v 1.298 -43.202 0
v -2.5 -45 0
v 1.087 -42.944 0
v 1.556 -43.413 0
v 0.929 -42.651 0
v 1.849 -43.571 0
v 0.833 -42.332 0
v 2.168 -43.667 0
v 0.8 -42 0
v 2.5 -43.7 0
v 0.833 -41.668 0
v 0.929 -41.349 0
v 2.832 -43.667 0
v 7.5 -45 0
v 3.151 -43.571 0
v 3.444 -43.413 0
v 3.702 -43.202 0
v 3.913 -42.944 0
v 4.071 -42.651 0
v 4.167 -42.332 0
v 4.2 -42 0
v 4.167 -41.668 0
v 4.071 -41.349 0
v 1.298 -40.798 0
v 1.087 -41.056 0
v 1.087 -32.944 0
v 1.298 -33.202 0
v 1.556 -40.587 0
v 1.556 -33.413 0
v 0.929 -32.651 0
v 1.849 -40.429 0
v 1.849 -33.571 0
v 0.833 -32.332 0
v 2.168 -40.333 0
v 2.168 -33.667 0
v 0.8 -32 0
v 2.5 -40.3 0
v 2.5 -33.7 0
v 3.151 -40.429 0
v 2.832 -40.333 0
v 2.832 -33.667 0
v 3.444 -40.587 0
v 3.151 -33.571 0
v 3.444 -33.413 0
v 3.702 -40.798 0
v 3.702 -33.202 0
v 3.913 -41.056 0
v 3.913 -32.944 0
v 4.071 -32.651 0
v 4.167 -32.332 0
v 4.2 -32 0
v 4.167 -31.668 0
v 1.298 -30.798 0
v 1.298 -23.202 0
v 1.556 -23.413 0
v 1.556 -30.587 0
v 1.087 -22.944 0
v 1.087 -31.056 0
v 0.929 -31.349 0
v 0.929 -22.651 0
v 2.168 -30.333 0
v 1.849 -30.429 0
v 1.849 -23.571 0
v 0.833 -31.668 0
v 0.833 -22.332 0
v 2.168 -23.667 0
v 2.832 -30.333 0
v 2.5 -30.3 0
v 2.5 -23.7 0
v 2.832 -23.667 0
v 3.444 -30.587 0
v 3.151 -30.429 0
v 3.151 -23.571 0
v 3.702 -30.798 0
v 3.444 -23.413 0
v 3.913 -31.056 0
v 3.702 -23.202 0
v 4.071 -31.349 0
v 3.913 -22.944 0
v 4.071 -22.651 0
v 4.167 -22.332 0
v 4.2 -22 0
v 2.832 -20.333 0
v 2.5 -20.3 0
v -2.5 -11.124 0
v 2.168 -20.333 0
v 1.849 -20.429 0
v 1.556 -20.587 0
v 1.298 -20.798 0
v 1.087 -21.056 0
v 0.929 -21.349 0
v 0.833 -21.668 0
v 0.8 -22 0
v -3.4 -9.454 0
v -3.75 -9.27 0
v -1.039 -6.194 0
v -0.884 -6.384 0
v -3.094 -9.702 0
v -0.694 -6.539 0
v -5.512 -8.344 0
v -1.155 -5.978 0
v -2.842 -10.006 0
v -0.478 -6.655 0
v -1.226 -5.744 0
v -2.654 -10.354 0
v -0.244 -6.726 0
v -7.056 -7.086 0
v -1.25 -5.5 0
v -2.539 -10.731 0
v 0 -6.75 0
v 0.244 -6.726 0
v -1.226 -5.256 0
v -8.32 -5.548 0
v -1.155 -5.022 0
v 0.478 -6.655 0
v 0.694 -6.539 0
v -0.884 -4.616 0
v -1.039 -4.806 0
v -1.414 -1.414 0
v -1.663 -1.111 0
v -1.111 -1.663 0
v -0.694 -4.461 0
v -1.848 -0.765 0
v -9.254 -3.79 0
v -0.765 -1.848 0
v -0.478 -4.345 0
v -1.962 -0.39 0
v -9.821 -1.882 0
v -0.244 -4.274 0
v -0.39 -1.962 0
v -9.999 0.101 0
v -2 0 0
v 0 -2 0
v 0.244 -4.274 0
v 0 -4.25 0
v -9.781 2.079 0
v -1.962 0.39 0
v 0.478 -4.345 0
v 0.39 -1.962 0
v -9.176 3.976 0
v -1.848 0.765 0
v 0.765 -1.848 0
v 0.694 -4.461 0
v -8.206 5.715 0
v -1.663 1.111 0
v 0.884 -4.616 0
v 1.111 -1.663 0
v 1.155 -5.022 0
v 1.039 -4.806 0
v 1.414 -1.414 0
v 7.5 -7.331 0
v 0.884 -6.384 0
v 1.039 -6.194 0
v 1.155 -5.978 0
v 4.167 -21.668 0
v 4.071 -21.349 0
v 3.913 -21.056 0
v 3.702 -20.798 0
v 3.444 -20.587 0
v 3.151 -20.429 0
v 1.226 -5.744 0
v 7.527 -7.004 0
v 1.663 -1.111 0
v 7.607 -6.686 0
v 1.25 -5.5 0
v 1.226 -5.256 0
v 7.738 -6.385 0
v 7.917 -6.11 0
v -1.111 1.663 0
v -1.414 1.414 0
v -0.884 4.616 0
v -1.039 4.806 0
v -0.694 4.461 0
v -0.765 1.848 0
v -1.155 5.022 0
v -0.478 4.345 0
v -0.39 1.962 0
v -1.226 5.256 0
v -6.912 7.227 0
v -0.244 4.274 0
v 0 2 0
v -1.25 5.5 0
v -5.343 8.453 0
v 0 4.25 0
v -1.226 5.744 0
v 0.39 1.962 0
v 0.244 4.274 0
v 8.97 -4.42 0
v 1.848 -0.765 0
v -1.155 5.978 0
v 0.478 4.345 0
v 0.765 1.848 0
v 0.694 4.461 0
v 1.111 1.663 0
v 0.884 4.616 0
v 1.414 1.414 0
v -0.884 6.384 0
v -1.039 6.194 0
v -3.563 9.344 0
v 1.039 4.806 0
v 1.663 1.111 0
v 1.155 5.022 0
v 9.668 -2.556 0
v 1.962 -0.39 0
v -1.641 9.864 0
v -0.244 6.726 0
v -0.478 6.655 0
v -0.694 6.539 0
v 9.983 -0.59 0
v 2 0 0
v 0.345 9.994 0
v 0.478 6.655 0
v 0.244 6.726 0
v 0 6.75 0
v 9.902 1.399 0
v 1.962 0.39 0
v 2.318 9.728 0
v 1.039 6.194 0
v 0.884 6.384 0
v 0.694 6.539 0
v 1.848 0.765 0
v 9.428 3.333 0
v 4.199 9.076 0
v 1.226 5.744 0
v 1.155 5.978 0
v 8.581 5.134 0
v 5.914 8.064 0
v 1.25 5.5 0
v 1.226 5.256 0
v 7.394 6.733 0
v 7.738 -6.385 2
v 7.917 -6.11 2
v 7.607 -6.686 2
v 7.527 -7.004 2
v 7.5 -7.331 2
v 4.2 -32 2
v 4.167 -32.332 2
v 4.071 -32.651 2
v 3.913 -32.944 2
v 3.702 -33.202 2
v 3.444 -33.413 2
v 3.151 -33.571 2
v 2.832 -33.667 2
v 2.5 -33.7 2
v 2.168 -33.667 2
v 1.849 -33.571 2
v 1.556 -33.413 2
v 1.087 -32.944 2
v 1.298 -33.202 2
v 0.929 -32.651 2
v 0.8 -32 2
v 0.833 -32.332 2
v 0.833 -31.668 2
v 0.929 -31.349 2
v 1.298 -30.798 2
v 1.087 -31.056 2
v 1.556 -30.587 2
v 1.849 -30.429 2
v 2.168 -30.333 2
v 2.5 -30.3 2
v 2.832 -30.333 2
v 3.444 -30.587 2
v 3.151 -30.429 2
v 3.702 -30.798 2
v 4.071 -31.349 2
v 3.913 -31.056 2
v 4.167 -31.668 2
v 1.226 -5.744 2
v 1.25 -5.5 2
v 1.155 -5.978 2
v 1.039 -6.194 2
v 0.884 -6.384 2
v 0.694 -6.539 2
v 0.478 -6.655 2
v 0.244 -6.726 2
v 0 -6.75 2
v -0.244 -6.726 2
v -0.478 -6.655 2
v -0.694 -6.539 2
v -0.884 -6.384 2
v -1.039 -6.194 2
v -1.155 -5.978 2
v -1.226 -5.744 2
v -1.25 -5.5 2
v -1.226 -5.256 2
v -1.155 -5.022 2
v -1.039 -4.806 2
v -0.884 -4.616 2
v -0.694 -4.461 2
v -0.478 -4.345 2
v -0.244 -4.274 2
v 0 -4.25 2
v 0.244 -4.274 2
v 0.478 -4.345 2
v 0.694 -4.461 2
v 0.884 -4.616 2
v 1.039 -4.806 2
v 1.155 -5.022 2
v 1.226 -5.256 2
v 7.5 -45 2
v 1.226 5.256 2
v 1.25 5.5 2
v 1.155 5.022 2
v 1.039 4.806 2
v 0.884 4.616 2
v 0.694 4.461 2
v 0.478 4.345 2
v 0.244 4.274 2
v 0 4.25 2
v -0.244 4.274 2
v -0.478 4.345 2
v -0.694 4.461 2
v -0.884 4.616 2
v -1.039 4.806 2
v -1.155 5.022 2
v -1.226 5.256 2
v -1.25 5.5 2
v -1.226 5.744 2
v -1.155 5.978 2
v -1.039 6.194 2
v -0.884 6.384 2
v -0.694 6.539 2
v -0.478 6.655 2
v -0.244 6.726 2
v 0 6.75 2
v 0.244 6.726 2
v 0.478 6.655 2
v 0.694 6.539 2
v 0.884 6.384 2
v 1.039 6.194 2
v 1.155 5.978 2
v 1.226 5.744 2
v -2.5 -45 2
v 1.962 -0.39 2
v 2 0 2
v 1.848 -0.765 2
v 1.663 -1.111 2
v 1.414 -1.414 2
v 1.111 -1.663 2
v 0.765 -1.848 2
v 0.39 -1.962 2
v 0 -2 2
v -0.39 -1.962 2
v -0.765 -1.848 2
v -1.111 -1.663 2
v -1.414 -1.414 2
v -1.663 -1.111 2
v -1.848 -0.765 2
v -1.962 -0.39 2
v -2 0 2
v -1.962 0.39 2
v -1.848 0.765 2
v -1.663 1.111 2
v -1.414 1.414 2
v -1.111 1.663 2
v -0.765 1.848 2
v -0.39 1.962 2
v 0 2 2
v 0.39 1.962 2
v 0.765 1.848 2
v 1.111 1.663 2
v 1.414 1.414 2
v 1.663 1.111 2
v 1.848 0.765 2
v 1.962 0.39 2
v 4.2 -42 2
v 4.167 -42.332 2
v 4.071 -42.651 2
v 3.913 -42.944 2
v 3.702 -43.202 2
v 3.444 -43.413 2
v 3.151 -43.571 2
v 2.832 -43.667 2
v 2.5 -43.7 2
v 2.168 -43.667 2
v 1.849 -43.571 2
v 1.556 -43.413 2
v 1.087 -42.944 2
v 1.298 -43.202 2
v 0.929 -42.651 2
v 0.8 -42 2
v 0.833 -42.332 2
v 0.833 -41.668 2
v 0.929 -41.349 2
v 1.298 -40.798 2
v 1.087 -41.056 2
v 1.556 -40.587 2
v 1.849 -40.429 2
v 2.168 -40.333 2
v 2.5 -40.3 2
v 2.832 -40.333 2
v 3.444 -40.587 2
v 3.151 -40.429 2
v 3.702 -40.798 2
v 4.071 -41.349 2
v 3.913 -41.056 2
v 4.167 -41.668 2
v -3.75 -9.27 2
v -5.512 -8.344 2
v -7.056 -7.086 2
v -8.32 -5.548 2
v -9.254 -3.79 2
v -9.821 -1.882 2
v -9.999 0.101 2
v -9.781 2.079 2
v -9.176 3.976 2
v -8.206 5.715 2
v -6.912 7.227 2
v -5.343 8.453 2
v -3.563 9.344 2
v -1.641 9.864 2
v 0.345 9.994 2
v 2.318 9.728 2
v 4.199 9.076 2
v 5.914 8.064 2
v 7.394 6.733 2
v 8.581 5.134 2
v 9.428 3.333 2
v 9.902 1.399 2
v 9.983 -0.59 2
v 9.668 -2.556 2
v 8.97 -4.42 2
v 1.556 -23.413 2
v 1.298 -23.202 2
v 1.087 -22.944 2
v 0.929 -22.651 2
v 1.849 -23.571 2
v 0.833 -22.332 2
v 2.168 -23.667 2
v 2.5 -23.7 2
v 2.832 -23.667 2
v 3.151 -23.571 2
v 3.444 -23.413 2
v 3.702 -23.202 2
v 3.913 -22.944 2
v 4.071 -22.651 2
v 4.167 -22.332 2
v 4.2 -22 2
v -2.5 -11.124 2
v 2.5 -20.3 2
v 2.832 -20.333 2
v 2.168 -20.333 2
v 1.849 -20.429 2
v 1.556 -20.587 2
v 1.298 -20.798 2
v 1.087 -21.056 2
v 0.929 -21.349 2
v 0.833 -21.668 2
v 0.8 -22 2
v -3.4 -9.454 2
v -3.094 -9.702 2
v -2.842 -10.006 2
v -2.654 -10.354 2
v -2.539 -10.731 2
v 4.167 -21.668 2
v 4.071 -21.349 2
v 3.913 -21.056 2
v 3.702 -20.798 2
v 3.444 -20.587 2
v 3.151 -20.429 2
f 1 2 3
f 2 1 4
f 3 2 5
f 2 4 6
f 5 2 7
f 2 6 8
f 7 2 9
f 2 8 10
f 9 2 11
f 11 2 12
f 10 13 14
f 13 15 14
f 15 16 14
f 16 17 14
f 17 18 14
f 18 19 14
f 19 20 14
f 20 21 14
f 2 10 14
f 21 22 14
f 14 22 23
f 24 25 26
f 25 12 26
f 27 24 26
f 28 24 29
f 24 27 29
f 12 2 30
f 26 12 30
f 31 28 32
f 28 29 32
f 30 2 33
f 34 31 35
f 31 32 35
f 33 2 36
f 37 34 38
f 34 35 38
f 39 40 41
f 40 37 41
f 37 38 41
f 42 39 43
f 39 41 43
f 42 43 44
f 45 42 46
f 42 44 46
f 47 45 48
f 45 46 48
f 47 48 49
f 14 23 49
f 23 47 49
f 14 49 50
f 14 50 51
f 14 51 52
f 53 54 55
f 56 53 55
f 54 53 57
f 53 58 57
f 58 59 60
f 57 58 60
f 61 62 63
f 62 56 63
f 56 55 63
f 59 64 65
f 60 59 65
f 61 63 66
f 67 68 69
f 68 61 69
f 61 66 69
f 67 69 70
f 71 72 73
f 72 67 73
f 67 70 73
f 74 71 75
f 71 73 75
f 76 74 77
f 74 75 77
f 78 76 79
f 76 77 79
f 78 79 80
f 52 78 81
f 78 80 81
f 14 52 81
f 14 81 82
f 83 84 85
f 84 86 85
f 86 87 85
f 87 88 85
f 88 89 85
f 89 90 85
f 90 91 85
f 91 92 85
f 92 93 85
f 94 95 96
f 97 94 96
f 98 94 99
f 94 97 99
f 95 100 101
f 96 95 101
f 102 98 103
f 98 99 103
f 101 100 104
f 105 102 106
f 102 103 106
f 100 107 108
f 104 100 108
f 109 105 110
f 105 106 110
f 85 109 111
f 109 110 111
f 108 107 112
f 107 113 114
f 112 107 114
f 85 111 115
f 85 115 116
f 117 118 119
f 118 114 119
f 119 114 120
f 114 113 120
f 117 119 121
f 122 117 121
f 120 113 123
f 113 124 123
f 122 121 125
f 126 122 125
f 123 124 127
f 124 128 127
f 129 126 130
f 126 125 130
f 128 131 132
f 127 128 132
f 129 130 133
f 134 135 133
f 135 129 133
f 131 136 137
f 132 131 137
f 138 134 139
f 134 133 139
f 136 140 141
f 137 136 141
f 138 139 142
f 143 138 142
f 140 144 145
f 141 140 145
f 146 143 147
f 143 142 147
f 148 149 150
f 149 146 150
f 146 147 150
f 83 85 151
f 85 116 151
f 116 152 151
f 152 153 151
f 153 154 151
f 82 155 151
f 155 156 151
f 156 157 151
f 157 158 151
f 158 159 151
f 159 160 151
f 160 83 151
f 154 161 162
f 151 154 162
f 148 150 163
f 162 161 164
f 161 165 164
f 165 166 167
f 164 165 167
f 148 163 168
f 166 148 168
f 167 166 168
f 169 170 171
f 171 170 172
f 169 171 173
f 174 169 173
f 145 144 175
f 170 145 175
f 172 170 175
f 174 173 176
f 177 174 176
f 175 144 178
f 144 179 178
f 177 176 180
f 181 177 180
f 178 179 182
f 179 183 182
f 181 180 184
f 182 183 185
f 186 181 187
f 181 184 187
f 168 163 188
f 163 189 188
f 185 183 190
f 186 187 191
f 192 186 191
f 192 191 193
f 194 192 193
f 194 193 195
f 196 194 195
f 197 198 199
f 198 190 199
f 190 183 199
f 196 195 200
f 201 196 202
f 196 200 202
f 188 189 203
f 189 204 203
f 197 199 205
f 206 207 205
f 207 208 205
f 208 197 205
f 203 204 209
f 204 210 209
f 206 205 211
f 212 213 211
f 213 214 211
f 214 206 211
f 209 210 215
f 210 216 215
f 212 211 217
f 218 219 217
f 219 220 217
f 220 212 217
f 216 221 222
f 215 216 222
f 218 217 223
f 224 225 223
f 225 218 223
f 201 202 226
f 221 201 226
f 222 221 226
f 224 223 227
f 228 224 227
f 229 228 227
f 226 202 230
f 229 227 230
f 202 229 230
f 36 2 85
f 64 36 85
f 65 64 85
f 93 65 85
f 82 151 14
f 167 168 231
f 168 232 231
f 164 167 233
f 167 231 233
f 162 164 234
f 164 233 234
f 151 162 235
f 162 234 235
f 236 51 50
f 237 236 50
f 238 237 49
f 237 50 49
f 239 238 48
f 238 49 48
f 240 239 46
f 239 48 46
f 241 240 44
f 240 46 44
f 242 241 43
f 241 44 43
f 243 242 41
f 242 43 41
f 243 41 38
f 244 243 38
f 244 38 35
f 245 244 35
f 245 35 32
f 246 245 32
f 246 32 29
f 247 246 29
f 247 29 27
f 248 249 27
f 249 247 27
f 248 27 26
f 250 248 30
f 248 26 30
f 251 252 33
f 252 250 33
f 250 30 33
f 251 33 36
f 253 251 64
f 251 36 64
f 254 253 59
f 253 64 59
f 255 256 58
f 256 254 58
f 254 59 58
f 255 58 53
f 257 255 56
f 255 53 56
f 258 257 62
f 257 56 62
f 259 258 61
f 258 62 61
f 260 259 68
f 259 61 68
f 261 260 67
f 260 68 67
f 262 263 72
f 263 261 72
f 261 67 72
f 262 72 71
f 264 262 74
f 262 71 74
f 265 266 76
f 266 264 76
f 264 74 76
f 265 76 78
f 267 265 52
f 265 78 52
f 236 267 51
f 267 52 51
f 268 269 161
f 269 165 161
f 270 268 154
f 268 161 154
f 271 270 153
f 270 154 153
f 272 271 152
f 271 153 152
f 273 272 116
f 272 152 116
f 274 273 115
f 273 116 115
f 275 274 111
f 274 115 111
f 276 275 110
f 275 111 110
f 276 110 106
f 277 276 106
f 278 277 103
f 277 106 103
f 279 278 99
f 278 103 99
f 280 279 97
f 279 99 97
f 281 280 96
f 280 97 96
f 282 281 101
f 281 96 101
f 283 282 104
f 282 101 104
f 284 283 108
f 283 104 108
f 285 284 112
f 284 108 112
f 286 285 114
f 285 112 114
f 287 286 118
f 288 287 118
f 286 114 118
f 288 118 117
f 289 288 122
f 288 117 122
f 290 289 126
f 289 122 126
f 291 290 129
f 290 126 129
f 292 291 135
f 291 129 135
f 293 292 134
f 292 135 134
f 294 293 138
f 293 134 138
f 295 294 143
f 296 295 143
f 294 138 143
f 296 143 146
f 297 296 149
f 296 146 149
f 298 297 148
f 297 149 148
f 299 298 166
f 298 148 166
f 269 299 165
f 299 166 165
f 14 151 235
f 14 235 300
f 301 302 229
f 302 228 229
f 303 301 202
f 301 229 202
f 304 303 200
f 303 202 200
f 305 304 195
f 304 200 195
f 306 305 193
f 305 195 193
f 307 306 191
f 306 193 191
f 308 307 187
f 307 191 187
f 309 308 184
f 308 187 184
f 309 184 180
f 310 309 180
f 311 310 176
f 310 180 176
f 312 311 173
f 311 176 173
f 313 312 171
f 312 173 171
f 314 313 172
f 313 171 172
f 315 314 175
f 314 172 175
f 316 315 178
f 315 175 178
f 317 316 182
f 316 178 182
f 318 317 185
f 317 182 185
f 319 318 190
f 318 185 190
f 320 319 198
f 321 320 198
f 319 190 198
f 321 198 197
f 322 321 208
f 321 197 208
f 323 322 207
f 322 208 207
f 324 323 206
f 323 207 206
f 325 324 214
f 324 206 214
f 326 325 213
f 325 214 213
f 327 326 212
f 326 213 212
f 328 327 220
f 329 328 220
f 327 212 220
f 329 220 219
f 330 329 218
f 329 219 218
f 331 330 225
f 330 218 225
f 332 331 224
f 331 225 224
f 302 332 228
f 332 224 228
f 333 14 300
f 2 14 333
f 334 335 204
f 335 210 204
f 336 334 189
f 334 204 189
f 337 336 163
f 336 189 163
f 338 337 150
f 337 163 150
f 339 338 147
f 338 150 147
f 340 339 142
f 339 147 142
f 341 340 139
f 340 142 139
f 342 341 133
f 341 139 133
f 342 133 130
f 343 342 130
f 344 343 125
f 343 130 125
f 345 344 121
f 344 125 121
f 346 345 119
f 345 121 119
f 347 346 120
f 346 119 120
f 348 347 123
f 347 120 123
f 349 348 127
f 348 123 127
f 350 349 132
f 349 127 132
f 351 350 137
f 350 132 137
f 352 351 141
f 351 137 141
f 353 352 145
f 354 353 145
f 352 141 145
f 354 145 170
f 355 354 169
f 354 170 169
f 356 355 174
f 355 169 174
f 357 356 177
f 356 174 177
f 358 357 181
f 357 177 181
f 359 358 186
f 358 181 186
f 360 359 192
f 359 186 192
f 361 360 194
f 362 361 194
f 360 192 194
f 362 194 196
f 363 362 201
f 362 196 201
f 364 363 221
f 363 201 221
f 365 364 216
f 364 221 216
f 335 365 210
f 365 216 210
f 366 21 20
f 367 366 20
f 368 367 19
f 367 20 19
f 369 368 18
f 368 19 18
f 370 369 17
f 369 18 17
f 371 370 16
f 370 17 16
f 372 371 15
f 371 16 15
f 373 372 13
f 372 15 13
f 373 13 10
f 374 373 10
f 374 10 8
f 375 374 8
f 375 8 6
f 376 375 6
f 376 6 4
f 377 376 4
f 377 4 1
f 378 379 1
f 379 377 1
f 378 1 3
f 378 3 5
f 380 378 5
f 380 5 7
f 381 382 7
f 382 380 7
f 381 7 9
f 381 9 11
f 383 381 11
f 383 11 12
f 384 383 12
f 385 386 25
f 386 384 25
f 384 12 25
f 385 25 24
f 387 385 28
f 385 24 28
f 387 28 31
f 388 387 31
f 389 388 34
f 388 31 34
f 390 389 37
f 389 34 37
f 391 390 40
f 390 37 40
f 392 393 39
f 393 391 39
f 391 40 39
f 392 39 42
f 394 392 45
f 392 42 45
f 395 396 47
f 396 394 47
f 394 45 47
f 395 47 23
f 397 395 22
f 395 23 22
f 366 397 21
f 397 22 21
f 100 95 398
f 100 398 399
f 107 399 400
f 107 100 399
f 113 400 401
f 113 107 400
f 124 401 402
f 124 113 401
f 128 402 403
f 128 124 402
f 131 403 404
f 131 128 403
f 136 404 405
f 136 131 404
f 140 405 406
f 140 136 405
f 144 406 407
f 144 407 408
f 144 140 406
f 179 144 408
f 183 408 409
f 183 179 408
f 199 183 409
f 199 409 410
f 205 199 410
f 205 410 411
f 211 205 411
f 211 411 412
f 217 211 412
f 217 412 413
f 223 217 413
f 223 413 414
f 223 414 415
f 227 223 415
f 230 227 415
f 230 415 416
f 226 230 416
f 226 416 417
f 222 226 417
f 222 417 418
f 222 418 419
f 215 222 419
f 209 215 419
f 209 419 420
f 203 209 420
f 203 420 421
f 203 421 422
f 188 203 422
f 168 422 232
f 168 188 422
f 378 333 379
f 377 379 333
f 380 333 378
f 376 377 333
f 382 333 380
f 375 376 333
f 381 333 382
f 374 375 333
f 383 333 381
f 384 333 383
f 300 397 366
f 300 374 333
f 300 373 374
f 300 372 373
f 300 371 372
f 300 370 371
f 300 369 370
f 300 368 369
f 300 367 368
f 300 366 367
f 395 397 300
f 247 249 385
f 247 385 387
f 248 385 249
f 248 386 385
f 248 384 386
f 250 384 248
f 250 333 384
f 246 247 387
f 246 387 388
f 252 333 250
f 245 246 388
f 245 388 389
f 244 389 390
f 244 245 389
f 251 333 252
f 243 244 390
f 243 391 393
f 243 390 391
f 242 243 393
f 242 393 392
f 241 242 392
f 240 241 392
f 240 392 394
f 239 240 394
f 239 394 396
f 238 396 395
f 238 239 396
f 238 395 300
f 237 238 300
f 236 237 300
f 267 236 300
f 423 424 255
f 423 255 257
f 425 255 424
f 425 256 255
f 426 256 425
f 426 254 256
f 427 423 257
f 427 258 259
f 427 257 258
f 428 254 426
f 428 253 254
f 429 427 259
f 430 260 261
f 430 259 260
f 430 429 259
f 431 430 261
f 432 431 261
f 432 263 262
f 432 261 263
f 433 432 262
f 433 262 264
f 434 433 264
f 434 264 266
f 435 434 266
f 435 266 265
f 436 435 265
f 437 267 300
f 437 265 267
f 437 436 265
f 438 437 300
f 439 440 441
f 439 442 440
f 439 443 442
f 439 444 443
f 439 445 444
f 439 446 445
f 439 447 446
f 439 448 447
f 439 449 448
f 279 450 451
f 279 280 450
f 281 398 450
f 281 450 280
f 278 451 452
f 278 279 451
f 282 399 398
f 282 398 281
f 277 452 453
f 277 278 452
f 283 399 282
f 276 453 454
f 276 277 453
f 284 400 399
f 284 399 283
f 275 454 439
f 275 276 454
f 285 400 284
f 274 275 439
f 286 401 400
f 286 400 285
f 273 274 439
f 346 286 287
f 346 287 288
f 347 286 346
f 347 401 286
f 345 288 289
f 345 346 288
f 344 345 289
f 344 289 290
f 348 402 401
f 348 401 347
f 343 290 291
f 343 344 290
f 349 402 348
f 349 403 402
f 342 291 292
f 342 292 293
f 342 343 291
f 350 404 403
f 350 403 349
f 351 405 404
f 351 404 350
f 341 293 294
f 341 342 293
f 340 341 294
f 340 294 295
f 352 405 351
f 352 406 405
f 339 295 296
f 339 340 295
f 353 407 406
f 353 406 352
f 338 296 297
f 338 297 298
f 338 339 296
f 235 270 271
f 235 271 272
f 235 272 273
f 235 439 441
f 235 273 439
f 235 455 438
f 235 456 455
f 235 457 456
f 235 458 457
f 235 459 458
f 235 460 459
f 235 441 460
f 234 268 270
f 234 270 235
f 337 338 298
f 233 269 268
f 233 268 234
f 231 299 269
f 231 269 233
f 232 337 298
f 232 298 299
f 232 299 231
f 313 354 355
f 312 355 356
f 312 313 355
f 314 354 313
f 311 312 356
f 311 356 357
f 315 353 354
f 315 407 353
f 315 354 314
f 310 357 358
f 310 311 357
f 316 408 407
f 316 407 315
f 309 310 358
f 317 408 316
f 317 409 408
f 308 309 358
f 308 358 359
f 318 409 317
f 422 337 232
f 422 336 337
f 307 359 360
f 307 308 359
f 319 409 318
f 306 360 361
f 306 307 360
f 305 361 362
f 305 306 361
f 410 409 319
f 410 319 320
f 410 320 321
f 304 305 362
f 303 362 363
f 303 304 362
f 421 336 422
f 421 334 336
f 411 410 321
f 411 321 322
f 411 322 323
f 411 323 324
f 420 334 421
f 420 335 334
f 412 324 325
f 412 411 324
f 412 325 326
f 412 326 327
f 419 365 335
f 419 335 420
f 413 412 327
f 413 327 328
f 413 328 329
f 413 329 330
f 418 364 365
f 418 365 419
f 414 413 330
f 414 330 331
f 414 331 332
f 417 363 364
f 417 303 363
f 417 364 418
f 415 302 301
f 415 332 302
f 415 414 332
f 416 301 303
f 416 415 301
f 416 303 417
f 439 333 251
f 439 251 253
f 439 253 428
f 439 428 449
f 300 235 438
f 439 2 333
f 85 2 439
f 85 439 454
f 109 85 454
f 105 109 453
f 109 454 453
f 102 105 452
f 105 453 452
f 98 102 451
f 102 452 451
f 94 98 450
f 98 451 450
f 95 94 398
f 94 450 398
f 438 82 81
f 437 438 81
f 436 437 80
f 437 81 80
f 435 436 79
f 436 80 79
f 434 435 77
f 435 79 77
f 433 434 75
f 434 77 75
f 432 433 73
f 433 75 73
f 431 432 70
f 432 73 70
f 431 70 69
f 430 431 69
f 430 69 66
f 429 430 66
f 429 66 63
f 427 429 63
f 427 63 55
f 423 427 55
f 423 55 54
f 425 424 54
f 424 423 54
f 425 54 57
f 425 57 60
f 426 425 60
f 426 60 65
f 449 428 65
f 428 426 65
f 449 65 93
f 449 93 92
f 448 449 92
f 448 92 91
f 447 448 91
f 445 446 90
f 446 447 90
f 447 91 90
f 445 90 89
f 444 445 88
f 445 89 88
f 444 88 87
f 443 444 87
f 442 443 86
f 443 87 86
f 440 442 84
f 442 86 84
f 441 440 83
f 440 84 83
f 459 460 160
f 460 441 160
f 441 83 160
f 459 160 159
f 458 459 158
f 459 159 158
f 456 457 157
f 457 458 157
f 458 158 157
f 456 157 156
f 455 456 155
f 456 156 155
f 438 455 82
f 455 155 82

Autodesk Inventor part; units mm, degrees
ref_plane "YZ Plane" through (0, 0, 0) normal (1, 0, 0) x (0, 1, 0)
ref_plane "XZ Plane" through (0, 0, 0) normal (0, 1, 0) x (-1, 0, 0)
ref_plane "XY Plane" through (0, 0, 0) normal (0, 0, 1) x (1, 0, 0)
sketch "スケッチ1" plane through (0, 0, 0) normal (0, 0, 1) x (1, 0, 0)
  circle A0 centre (0, 0) radius 10
  line L0 (0, 0) -> (7.5, 0)
  line L1 (7.5, 0) -> (7.5, -45)
  line L2 (7.5, -45) -> (-2.5, -45)
  line L3 (-2.5, -45) -> (-2.5, 0)
  circle A1 centre (2.5, -22) radius 1.7
  circle A2 centre (2.5, -32) radius 1.7
  circle A3 centre (2.5, -42) radius 1.7
  circle A4 centre (0, 0) radius 5.5
  circle A5 centre (0, 5.5) radius 1.25
  circle A6 centre (0, -5.5) radius 1.25
  circle A7 centre (0, 0) radius 2
  line L4 (0, 0) -> (0, -45)
  point P0 (7.5, -6.6144)
  point P1 (-2.5, -9.6825)
  dimension "d0" = 20
  dimension "d3" = 7.5
  dimension "d4" = 45
  dimension "d5" = 10
  dimension "d6" = 3.4
  dimension "d7" = 3.4
  dimension "d8" = 3.4
  dimension "d9" = 11
  dimension "d10" = 2.5
  dimension "d11" = 2.5
  dimension "d12" = 4
  dimension "d16" = 2.5
  dimension "d17" = 2.5
  dimension "d18" = 2.5
extrude "押し出し1" add sketch "スケッチ1" along normal blind 2 contours A0 L1 L0 A4 A5 L3 | L3 A4 A6 L4 A0 | A0 L4 L2 L3 | L1 L2 L4 A0 | A0 L4 A6 A4 L0 L1 | A4 A5 L0 A7 L4 A6 | A4 A6 L4 A7 L0
fillet "フィレット1" radius 2 2 edges at (7.5, -6.6144, 1) (-2.5, -9.6825, 1)
properties part number "cutter_board_claws_endeffector_8_5_rotary-blade"
